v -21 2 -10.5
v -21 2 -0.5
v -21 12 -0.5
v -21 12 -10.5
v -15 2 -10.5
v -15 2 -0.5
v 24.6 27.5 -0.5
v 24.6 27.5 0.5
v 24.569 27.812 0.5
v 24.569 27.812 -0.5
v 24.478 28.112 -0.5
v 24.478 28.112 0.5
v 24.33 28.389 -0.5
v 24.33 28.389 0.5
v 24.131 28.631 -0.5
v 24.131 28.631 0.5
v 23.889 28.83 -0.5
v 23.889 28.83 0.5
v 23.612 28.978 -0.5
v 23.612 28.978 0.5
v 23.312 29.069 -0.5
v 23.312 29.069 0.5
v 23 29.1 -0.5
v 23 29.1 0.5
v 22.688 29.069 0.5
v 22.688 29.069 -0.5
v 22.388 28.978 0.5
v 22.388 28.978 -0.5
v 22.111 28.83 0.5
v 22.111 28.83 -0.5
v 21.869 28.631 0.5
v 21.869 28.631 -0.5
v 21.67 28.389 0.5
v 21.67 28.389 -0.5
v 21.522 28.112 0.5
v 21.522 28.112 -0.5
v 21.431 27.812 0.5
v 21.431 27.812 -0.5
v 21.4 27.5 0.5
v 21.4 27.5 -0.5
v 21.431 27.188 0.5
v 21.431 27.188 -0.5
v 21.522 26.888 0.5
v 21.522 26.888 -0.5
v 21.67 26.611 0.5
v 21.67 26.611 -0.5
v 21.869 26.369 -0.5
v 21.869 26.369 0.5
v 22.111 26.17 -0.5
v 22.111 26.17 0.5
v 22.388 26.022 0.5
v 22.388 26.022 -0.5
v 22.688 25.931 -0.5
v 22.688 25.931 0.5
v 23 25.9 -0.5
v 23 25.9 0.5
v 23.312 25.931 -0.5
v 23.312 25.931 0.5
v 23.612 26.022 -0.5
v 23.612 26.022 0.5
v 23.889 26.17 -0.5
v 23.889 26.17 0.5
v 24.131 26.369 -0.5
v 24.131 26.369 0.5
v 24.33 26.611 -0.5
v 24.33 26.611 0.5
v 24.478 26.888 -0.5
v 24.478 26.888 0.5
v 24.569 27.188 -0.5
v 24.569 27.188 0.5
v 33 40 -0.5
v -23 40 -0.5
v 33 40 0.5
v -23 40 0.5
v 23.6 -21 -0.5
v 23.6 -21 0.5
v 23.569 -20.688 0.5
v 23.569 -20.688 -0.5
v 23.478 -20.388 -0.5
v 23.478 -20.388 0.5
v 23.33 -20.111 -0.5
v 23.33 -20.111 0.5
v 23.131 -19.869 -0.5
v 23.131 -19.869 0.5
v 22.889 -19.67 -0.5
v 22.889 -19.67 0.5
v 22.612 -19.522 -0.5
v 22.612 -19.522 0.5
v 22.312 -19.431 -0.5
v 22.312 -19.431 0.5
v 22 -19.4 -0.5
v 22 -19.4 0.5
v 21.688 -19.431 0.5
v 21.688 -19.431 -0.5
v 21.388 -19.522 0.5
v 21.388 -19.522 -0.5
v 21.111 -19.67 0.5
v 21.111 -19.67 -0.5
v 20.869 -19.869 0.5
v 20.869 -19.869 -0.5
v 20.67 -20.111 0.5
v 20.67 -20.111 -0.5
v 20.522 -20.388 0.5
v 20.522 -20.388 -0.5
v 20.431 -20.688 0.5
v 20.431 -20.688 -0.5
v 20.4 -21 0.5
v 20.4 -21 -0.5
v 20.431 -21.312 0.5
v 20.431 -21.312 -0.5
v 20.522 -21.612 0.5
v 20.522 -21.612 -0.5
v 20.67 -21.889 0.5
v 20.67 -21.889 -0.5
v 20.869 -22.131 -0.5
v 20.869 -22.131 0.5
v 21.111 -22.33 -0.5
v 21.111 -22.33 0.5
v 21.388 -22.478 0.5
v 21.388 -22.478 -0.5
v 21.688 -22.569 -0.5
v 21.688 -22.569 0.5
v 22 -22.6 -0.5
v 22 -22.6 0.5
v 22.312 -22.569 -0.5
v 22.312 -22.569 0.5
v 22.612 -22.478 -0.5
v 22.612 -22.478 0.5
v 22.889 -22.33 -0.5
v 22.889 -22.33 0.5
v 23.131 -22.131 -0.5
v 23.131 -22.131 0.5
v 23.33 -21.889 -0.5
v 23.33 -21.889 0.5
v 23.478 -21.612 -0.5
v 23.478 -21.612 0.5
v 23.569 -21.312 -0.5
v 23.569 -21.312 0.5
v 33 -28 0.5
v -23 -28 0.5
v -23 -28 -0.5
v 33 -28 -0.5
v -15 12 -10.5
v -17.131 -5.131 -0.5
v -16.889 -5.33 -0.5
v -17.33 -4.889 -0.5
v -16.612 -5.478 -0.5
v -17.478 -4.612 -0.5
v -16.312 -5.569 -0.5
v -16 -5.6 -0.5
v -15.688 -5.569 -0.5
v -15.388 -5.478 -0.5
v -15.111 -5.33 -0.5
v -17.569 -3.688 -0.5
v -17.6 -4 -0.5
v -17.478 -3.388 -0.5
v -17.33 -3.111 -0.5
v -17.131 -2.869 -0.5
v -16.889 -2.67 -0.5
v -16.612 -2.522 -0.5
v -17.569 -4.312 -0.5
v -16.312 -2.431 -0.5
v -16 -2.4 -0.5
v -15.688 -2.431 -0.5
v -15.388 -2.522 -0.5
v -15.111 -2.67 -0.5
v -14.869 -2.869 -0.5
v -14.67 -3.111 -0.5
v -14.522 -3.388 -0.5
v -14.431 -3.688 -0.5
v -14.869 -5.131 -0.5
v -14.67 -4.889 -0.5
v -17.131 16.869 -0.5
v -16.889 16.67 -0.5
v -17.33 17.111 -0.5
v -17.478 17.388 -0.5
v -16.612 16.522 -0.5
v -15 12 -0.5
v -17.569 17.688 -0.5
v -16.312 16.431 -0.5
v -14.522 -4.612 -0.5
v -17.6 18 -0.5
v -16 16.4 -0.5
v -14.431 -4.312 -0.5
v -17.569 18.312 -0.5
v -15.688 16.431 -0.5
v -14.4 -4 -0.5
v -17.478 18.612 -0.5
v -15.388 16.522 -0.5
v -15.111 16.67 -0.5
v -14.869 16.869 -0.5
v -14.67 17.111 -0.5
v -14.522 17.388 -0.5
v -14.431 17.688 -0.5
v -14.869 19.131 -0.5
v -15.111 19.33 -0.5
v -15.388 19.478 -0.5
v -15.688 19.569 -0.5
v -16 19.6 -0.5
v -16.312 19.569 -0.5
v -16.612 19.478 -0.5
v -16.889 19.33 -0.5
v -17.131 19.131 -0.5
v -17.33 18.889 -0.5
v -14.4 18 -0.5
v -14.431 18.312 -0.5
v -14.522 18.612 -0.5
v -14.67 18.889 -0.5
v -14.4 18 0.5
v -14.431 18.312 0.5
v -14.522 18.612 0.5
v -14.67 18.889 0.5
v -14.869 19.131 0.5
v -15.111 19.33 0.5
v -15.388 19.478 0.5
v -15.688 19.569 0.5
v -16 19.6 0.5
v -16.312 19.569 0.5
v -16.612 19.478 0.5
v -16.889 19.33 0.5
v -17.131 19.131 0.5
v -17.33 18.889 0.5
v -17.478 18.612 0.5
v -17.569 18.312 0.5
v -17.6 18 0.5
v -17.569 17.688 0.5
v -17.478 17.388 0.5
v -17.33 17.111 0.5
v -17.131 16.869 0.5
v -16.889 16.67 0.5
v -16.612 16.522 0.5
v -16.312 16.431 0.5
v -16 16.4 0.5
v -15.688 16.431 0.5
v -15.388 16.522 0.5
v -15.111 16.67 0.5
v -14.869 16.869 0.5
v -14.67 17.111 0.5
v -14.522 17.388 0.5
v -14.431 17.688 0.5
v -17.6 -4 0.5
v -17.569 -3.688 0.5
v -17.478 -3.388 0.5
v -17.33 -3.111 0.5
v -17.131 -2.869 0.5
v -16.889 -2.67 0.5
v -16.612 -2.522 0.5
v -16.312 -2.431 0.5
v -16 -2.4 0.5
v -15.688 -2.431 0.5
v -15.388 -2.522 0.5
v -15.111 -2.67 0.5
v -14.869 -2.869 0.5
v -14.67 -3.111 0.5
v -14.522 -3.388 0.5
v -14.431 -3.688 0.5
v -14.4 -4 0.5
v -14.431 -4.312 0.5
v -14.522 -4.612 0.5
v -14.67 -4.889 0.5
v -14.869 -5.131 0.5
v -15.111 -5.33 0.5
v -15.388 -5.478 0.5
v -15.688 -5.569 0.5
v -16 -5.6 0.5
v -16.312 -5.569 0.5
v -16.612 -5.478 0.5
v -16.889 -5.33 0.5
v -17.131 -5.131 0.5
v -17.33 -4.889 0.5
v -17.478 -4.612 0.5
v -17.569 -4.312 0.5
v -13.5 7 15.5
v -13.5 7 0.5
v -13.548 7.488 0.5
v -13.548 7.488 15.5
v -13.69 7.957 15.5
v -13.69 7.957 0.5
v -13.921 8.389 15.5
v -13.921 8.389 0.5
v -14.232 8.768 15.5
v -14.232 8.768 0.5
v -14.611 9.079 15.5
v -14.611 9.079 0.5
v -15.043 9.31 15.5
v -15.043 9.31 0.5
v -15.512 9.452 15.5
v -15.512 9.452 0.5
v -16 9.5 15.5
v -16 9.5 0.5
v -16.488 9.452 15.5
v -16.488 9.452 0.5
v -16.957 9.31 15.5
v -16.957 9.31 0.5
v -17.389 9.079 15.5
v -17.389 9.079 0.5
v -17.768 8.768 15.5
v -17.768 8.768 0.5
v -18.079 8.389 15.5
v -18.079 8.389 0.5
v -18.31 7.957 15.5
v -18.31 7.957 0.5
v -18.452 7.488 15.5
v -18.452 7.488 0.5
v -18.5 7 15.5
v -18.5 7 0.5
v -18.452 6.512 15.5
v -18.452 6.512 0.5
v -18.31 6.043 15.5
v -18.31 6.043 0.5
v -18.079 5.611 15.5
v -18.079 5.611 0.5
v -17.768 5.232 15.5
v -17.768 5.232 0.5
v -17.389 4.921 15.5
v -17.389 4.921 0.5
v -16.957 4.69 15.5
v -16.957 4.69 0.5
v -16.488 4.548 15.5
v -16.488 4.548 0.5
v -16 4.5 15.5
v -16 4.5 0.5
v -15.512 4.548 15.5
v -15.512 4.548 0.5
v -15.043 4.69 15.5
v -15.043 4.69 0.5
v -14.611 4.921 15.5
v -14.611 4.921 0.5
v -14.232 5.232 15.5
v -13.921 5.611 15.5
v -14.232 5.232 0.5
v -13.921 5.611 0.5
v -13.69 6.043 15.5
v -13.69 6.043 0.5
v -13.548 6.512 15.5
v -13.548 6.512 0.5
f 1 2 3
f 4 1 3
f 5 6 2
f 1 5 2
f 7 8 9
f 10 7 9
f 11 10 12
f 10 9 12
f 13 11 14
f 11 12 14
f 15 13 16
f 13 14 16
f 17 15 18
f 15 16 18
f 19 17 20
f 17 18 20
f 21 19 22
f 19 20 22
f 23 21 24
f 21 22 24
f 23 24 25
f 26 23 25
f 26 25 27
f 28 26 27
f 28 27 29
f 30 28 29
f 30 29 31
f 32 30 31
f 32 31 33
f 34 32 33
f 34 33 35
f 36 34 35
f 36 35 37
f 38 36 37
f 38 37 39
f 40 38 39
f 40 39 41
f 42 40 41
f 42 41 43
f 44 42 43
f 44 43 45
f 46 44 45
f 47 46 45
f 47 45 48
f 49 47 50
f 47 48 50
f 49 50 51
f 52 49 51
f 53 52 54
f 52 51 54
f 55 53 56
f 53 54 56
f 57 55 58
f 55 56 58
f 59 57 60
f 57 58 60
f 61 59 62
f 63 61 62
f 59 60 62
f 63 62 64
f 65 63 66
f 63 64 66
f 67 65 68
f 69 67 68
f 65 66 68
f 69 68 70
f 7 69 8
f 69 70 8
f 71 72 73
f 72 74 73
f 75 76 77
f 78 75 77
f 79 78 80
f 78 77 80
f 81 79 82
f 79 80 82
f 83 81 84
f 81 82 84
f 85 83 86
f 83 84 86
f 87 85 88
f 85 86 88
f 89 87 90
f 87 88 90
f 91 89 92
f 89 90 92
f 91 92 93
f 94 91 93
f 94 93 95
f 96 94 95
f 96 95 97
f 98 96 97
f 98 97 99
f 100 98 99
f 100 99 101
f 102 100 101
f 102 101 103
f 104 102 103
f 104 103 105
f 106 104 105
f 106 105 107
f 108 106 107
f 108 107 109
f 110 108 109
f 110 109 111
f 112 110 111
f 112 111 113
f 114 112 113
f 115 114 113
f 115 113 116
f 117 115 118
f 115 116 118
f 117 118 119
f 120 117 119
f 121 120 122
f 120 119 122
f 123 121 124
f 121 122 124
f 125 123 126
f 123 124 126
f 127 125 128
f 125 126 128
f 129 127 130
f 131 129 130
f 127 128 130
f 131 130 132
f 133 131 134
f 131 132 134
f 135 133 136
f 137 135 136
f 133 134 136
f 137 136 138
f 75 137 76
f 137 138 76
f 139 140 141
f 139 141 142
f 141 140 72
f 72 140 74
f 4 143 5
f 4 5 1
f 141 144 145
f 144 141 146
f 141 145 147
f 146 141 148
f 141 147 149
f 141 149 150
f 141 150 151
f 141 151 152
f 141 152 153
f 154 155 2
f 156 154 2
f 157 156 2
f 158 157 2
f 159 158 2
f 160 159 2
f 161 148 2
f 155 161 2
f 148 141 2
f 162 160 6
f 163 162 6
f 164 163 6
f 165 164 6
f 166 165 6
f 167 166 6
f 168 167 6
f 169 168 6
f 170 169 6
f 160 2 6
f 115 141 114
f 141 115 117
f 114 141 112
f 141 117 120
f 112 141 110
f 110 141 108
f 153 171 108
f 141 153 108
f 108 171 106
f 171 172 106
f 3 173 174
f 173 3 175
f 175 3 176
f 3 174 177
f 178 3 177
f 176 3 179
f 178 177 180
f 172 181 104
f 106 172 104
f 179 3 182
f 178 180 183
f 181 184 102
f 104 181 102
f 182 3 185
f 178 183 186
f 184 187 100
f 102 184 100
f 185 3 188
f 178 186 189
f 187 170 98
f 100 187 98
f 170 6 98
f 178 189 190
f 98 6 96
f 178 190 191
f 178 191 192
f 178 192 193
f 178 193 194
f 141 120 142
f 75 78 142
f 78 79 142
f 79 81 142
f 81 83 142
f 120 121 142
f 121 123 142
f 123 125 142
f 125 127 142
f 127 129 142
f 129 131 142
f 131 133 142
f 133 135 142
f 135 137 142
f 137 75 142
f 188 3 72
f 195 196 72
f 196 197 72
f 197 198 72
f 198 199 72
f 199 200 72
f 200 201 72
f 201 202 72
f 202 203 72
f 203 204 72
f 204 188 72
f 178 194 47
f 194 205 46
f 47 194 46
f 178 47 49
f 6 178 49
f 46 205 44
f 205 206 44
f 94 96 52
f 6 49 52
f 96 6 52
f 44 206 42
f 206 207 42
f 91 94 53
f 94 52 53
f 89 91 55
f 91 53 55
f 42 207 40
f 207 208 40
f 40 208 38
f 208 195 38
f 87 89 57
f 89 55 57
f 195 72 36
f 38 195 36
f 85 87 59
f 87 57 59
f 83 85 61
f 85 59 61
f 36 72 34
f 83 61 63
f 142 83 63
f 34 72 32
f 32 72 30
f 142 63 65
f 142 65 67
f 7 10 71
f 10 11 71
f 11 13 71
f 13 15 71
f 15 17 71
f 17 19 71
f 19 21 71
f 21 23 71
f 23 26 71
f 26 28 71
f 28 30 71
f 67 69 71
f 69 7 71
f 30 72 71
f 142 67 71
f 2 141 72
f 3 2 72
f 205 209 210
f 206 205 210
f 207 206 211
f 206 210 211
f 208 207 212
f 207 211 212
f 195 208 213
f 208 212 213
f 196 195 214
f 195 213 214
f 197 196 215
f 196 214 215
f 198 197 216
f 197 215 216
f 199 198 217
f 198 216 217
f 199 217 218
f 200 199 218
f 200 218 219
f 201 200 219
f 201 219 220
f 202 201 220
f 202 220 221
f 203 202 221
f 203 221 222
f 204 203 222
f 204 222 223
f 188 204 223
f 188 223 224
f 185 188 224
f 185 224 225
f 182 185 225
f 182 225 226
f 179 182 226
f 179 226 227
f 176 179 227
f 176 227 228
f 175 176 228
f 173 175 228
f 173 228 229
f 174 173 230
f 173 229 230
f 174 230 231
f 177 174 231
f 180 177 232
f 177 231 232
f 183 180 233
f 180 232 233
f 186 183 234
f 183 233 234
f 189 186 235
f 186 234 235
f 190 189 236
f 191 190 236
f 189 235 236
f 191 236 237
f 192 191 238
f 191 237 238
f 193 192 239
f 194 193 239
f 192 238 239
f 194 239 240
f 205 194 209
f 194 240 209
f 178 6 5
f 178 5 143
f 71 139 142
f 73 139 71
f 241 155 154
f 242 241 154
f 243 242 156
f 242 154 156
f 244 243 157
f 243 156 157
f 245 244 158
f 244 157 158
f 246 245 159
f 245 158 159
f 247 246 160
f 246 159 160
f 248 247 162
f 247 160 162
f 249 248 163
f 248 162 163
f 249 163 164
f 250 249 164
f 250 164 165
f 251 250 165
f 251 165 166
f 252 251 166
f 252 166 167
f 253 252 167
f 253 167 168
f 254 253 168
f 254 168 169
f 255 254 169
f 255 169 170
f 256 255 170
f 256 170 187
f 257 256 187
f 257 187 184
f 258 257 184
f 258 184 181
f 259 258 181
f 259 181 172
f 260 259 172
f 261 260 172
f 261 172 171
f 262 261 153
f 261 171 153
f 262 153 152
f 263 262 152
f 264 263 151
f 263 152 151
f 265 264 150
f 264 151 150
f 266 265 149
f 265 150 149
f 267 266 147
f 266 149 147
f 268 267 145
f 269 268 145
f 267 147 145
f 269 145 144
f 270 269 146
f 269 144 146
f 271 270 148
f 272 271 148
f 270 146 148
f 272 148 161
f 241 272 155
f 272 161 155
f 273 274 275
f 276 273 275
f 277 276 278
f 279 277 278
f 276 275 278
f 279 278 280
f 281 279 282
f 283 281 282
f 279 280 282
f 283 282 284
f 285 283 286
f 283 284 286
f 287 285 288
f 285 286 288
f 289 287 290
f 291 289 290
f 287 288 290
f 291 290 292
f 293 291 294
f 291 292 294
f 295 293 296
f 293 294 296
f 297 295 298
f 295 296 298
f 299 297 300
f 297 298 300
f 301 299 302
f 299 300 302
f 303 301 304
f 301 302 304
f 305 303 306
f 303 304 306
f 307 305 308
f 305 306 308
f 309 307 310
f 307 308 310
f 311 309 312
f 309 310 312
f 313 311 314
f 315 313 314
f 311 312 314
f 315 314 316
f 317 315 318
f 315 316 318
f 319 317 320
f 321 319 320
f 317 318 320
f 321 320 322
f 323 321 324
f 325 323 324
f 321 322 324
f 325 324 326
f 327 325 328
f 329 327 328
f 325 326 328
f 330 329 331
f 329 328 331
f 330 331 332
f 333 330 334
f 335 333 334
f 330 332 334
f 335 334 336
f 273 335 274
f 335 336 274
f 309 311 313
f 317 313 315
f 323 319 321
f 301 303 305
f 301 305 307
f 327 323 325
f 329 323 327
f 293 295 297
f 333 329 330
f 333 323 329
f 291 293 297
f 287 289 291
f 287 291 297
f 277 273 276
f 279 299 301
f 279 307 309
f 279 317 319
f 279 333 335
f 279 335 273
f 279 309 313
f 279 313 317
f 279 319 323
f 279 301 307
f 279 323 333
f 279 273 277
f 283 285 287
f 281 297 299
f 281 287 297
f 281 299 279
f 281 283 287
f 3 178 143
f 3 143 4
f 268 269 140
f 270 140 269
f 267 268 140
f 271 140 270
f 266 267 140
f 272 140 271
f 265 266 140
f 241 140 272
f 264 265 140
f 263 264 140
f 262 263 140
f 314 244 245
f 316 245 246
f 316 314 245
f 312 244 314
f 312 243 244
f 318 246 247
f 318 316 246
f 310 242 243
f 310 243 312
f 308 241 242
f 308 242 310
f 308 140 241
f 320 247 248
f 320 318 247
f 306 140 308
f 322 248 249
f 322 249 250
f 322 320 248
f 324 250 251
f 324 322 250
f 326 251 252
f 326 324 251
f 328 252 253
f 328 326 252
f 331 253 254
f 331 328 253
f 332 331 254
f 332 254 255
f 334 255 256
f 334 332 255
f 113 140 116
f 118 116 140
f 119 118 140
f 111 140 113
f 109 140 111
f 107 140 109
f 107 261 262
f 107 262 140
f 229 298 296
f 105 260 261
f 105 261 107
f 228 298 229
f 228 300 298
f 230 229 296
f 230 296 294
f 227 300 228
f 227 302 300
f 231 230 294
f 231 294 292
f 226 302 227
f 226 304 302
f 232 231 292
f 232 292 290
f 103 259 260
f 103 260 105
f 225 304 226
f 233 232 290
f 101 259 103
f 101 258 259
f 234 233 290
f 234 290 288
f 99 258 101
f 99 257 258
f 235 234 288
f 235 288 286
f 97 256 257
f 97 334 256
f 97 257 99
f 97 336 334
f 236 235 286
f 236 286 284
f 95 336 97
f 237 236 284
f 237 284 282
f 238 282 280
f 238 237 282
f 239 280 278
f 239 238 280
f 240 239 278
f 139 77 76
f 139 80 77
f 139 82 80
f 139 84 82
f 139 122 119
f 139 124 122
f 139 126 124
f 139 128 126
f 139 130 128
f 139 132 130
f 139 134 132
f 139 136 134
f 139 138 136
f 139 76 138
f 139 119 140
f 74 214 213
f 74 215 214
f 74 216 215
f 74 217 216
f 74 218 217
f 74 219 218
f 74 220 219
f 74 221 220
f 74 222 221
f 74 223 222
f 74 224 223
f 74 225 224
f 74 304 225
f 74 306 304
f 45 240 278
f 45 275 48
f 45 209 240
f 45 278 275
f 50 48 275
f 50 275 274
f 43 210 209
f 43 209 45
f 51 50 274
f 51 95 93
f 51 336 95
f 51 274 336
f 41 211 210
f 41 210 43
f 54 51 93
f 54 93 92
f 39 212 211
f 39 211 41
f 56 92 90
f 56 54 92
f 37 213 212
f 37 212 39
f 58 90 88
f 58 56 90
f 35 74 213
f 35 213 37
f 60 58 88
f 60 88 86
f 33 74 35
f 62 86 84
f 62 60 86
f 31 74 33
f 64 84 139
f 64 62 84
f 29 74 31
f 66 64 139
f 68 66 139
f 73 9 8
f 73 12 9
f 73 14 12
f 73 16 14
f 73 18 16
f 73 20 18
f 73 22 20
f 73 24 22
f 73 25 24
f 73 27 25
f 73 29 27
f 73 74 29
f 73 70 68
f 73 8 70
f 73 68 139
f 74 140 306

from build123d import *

# Parameters (mm, degrees)
SKETCH_1_W          = 56
SKETCH_1_H          = 68
EXTRUDE_1_DEPTH     = 0.5
SKETCH_2_R          = 2.5
EXTRUDE_2_DEPTH     = 15
SKETCH_3_W          = 6
SKETCH_3_H          = 10
EXTRUDE_3_DEPTH     = 10
SKETCH_4_R          = 1.6
CUT_EXTRUDE_1_DEPTH = 10
SKETCH_5_R          = 1.6
CUT_EXTRUDE_2_DEPTH = 10
SKETCH_6_R          = 1.6
CUT_EXTRUDE_3_DEPTH = 10
SKETCH_7_R          = 1.6
CUT_EXTRUDE_4_DEPTH = 10


with BuildPart() as part:
    # ｽｹｯﾁ1 → ﾎﾞｽ - 押し出し1 (new, symmetric)
    with BuildSketch(Plane.XY):
        with Locations((5, 6)):
            Rectangle(SKETCH_1_W, SKETCH_1_H)
    extrude(amount=EXTRUDE_1_DEPTH, both=True)

    # ｽｹｯﾁ2 → ﾎﾞｽ - 押し出し2 (add)
    with BuildSketch(Plane.XY.offset(0.5)):
        with Locations((-16, 7)):
            Circle(SKETCH_2_R)
    extrude(amount=EXTRUDE_2_DEPTH)

    # ｽｹｯﾁ3 → ﾎﾞｽ - 押し出し3 (add)
    with BuildSketch(Plane(origin=(0, 0, -0.5), x_dir=(-1, 0, 0), z_dir=(0, 0, -1))):
        with Locations((18, 7)):
            Rectangle(SKETCH_3_W, SKETCH_3_H)
    extrude(amount=EXTRUDE_3_DEPTH)

    # ｽｹｯﾁ4 → ｶｯﾄ - 押し出し1 (cut)
    with BuildSketch(Plane(origin=(0, 0, -0.5), x_dir=(-1, 0, 0), z_dir=(0, 0, -1))):
        with Locations((16, -4)):
            Circle(SKETCH_4_R)
    extrude(amount=-CUT_EXTRUDE_1_DEPTH, mode=Mode.SUBTRACT)

    # ｽｹｯﾁ5 → ｶｯﾄ - 押し出し2 (cut)
    with BuildSketch(Plane.XY.offset(0.5)):
        with Locations((-16, 18)):
            Circle(SKETCH_5_R)
    extrude(amount=-CUT_EXTRUDE_2_DEPTH, mode=Mode.SUBTRACT)

    # ｽｹｯﾁ6 → ｶｯﾄ - 押し出し3 (cut)
    with BuildSketch(Plane.XY.offset(0.5)):
        with Locations((23, 27.5)):
            Circle(SKETCH_6_R)
    extrude(amount=-CUT_EXTRUDE_3_DEPTH, mode=Mode.SUBTRACT)

    # ｽｹｯﾁ7 → ｶｯﾄ - 押し出し4 (cut)
    with BuildSketch(Plane.XY.offset(0.5)):
        with Locations((22, -21)):
            Circle(SKETCH_7_R)
    extrude(amount=-CUT_EXTRUDE_4_DEPTH, mode=Mode.SUBTRACT)


solid = part.part
